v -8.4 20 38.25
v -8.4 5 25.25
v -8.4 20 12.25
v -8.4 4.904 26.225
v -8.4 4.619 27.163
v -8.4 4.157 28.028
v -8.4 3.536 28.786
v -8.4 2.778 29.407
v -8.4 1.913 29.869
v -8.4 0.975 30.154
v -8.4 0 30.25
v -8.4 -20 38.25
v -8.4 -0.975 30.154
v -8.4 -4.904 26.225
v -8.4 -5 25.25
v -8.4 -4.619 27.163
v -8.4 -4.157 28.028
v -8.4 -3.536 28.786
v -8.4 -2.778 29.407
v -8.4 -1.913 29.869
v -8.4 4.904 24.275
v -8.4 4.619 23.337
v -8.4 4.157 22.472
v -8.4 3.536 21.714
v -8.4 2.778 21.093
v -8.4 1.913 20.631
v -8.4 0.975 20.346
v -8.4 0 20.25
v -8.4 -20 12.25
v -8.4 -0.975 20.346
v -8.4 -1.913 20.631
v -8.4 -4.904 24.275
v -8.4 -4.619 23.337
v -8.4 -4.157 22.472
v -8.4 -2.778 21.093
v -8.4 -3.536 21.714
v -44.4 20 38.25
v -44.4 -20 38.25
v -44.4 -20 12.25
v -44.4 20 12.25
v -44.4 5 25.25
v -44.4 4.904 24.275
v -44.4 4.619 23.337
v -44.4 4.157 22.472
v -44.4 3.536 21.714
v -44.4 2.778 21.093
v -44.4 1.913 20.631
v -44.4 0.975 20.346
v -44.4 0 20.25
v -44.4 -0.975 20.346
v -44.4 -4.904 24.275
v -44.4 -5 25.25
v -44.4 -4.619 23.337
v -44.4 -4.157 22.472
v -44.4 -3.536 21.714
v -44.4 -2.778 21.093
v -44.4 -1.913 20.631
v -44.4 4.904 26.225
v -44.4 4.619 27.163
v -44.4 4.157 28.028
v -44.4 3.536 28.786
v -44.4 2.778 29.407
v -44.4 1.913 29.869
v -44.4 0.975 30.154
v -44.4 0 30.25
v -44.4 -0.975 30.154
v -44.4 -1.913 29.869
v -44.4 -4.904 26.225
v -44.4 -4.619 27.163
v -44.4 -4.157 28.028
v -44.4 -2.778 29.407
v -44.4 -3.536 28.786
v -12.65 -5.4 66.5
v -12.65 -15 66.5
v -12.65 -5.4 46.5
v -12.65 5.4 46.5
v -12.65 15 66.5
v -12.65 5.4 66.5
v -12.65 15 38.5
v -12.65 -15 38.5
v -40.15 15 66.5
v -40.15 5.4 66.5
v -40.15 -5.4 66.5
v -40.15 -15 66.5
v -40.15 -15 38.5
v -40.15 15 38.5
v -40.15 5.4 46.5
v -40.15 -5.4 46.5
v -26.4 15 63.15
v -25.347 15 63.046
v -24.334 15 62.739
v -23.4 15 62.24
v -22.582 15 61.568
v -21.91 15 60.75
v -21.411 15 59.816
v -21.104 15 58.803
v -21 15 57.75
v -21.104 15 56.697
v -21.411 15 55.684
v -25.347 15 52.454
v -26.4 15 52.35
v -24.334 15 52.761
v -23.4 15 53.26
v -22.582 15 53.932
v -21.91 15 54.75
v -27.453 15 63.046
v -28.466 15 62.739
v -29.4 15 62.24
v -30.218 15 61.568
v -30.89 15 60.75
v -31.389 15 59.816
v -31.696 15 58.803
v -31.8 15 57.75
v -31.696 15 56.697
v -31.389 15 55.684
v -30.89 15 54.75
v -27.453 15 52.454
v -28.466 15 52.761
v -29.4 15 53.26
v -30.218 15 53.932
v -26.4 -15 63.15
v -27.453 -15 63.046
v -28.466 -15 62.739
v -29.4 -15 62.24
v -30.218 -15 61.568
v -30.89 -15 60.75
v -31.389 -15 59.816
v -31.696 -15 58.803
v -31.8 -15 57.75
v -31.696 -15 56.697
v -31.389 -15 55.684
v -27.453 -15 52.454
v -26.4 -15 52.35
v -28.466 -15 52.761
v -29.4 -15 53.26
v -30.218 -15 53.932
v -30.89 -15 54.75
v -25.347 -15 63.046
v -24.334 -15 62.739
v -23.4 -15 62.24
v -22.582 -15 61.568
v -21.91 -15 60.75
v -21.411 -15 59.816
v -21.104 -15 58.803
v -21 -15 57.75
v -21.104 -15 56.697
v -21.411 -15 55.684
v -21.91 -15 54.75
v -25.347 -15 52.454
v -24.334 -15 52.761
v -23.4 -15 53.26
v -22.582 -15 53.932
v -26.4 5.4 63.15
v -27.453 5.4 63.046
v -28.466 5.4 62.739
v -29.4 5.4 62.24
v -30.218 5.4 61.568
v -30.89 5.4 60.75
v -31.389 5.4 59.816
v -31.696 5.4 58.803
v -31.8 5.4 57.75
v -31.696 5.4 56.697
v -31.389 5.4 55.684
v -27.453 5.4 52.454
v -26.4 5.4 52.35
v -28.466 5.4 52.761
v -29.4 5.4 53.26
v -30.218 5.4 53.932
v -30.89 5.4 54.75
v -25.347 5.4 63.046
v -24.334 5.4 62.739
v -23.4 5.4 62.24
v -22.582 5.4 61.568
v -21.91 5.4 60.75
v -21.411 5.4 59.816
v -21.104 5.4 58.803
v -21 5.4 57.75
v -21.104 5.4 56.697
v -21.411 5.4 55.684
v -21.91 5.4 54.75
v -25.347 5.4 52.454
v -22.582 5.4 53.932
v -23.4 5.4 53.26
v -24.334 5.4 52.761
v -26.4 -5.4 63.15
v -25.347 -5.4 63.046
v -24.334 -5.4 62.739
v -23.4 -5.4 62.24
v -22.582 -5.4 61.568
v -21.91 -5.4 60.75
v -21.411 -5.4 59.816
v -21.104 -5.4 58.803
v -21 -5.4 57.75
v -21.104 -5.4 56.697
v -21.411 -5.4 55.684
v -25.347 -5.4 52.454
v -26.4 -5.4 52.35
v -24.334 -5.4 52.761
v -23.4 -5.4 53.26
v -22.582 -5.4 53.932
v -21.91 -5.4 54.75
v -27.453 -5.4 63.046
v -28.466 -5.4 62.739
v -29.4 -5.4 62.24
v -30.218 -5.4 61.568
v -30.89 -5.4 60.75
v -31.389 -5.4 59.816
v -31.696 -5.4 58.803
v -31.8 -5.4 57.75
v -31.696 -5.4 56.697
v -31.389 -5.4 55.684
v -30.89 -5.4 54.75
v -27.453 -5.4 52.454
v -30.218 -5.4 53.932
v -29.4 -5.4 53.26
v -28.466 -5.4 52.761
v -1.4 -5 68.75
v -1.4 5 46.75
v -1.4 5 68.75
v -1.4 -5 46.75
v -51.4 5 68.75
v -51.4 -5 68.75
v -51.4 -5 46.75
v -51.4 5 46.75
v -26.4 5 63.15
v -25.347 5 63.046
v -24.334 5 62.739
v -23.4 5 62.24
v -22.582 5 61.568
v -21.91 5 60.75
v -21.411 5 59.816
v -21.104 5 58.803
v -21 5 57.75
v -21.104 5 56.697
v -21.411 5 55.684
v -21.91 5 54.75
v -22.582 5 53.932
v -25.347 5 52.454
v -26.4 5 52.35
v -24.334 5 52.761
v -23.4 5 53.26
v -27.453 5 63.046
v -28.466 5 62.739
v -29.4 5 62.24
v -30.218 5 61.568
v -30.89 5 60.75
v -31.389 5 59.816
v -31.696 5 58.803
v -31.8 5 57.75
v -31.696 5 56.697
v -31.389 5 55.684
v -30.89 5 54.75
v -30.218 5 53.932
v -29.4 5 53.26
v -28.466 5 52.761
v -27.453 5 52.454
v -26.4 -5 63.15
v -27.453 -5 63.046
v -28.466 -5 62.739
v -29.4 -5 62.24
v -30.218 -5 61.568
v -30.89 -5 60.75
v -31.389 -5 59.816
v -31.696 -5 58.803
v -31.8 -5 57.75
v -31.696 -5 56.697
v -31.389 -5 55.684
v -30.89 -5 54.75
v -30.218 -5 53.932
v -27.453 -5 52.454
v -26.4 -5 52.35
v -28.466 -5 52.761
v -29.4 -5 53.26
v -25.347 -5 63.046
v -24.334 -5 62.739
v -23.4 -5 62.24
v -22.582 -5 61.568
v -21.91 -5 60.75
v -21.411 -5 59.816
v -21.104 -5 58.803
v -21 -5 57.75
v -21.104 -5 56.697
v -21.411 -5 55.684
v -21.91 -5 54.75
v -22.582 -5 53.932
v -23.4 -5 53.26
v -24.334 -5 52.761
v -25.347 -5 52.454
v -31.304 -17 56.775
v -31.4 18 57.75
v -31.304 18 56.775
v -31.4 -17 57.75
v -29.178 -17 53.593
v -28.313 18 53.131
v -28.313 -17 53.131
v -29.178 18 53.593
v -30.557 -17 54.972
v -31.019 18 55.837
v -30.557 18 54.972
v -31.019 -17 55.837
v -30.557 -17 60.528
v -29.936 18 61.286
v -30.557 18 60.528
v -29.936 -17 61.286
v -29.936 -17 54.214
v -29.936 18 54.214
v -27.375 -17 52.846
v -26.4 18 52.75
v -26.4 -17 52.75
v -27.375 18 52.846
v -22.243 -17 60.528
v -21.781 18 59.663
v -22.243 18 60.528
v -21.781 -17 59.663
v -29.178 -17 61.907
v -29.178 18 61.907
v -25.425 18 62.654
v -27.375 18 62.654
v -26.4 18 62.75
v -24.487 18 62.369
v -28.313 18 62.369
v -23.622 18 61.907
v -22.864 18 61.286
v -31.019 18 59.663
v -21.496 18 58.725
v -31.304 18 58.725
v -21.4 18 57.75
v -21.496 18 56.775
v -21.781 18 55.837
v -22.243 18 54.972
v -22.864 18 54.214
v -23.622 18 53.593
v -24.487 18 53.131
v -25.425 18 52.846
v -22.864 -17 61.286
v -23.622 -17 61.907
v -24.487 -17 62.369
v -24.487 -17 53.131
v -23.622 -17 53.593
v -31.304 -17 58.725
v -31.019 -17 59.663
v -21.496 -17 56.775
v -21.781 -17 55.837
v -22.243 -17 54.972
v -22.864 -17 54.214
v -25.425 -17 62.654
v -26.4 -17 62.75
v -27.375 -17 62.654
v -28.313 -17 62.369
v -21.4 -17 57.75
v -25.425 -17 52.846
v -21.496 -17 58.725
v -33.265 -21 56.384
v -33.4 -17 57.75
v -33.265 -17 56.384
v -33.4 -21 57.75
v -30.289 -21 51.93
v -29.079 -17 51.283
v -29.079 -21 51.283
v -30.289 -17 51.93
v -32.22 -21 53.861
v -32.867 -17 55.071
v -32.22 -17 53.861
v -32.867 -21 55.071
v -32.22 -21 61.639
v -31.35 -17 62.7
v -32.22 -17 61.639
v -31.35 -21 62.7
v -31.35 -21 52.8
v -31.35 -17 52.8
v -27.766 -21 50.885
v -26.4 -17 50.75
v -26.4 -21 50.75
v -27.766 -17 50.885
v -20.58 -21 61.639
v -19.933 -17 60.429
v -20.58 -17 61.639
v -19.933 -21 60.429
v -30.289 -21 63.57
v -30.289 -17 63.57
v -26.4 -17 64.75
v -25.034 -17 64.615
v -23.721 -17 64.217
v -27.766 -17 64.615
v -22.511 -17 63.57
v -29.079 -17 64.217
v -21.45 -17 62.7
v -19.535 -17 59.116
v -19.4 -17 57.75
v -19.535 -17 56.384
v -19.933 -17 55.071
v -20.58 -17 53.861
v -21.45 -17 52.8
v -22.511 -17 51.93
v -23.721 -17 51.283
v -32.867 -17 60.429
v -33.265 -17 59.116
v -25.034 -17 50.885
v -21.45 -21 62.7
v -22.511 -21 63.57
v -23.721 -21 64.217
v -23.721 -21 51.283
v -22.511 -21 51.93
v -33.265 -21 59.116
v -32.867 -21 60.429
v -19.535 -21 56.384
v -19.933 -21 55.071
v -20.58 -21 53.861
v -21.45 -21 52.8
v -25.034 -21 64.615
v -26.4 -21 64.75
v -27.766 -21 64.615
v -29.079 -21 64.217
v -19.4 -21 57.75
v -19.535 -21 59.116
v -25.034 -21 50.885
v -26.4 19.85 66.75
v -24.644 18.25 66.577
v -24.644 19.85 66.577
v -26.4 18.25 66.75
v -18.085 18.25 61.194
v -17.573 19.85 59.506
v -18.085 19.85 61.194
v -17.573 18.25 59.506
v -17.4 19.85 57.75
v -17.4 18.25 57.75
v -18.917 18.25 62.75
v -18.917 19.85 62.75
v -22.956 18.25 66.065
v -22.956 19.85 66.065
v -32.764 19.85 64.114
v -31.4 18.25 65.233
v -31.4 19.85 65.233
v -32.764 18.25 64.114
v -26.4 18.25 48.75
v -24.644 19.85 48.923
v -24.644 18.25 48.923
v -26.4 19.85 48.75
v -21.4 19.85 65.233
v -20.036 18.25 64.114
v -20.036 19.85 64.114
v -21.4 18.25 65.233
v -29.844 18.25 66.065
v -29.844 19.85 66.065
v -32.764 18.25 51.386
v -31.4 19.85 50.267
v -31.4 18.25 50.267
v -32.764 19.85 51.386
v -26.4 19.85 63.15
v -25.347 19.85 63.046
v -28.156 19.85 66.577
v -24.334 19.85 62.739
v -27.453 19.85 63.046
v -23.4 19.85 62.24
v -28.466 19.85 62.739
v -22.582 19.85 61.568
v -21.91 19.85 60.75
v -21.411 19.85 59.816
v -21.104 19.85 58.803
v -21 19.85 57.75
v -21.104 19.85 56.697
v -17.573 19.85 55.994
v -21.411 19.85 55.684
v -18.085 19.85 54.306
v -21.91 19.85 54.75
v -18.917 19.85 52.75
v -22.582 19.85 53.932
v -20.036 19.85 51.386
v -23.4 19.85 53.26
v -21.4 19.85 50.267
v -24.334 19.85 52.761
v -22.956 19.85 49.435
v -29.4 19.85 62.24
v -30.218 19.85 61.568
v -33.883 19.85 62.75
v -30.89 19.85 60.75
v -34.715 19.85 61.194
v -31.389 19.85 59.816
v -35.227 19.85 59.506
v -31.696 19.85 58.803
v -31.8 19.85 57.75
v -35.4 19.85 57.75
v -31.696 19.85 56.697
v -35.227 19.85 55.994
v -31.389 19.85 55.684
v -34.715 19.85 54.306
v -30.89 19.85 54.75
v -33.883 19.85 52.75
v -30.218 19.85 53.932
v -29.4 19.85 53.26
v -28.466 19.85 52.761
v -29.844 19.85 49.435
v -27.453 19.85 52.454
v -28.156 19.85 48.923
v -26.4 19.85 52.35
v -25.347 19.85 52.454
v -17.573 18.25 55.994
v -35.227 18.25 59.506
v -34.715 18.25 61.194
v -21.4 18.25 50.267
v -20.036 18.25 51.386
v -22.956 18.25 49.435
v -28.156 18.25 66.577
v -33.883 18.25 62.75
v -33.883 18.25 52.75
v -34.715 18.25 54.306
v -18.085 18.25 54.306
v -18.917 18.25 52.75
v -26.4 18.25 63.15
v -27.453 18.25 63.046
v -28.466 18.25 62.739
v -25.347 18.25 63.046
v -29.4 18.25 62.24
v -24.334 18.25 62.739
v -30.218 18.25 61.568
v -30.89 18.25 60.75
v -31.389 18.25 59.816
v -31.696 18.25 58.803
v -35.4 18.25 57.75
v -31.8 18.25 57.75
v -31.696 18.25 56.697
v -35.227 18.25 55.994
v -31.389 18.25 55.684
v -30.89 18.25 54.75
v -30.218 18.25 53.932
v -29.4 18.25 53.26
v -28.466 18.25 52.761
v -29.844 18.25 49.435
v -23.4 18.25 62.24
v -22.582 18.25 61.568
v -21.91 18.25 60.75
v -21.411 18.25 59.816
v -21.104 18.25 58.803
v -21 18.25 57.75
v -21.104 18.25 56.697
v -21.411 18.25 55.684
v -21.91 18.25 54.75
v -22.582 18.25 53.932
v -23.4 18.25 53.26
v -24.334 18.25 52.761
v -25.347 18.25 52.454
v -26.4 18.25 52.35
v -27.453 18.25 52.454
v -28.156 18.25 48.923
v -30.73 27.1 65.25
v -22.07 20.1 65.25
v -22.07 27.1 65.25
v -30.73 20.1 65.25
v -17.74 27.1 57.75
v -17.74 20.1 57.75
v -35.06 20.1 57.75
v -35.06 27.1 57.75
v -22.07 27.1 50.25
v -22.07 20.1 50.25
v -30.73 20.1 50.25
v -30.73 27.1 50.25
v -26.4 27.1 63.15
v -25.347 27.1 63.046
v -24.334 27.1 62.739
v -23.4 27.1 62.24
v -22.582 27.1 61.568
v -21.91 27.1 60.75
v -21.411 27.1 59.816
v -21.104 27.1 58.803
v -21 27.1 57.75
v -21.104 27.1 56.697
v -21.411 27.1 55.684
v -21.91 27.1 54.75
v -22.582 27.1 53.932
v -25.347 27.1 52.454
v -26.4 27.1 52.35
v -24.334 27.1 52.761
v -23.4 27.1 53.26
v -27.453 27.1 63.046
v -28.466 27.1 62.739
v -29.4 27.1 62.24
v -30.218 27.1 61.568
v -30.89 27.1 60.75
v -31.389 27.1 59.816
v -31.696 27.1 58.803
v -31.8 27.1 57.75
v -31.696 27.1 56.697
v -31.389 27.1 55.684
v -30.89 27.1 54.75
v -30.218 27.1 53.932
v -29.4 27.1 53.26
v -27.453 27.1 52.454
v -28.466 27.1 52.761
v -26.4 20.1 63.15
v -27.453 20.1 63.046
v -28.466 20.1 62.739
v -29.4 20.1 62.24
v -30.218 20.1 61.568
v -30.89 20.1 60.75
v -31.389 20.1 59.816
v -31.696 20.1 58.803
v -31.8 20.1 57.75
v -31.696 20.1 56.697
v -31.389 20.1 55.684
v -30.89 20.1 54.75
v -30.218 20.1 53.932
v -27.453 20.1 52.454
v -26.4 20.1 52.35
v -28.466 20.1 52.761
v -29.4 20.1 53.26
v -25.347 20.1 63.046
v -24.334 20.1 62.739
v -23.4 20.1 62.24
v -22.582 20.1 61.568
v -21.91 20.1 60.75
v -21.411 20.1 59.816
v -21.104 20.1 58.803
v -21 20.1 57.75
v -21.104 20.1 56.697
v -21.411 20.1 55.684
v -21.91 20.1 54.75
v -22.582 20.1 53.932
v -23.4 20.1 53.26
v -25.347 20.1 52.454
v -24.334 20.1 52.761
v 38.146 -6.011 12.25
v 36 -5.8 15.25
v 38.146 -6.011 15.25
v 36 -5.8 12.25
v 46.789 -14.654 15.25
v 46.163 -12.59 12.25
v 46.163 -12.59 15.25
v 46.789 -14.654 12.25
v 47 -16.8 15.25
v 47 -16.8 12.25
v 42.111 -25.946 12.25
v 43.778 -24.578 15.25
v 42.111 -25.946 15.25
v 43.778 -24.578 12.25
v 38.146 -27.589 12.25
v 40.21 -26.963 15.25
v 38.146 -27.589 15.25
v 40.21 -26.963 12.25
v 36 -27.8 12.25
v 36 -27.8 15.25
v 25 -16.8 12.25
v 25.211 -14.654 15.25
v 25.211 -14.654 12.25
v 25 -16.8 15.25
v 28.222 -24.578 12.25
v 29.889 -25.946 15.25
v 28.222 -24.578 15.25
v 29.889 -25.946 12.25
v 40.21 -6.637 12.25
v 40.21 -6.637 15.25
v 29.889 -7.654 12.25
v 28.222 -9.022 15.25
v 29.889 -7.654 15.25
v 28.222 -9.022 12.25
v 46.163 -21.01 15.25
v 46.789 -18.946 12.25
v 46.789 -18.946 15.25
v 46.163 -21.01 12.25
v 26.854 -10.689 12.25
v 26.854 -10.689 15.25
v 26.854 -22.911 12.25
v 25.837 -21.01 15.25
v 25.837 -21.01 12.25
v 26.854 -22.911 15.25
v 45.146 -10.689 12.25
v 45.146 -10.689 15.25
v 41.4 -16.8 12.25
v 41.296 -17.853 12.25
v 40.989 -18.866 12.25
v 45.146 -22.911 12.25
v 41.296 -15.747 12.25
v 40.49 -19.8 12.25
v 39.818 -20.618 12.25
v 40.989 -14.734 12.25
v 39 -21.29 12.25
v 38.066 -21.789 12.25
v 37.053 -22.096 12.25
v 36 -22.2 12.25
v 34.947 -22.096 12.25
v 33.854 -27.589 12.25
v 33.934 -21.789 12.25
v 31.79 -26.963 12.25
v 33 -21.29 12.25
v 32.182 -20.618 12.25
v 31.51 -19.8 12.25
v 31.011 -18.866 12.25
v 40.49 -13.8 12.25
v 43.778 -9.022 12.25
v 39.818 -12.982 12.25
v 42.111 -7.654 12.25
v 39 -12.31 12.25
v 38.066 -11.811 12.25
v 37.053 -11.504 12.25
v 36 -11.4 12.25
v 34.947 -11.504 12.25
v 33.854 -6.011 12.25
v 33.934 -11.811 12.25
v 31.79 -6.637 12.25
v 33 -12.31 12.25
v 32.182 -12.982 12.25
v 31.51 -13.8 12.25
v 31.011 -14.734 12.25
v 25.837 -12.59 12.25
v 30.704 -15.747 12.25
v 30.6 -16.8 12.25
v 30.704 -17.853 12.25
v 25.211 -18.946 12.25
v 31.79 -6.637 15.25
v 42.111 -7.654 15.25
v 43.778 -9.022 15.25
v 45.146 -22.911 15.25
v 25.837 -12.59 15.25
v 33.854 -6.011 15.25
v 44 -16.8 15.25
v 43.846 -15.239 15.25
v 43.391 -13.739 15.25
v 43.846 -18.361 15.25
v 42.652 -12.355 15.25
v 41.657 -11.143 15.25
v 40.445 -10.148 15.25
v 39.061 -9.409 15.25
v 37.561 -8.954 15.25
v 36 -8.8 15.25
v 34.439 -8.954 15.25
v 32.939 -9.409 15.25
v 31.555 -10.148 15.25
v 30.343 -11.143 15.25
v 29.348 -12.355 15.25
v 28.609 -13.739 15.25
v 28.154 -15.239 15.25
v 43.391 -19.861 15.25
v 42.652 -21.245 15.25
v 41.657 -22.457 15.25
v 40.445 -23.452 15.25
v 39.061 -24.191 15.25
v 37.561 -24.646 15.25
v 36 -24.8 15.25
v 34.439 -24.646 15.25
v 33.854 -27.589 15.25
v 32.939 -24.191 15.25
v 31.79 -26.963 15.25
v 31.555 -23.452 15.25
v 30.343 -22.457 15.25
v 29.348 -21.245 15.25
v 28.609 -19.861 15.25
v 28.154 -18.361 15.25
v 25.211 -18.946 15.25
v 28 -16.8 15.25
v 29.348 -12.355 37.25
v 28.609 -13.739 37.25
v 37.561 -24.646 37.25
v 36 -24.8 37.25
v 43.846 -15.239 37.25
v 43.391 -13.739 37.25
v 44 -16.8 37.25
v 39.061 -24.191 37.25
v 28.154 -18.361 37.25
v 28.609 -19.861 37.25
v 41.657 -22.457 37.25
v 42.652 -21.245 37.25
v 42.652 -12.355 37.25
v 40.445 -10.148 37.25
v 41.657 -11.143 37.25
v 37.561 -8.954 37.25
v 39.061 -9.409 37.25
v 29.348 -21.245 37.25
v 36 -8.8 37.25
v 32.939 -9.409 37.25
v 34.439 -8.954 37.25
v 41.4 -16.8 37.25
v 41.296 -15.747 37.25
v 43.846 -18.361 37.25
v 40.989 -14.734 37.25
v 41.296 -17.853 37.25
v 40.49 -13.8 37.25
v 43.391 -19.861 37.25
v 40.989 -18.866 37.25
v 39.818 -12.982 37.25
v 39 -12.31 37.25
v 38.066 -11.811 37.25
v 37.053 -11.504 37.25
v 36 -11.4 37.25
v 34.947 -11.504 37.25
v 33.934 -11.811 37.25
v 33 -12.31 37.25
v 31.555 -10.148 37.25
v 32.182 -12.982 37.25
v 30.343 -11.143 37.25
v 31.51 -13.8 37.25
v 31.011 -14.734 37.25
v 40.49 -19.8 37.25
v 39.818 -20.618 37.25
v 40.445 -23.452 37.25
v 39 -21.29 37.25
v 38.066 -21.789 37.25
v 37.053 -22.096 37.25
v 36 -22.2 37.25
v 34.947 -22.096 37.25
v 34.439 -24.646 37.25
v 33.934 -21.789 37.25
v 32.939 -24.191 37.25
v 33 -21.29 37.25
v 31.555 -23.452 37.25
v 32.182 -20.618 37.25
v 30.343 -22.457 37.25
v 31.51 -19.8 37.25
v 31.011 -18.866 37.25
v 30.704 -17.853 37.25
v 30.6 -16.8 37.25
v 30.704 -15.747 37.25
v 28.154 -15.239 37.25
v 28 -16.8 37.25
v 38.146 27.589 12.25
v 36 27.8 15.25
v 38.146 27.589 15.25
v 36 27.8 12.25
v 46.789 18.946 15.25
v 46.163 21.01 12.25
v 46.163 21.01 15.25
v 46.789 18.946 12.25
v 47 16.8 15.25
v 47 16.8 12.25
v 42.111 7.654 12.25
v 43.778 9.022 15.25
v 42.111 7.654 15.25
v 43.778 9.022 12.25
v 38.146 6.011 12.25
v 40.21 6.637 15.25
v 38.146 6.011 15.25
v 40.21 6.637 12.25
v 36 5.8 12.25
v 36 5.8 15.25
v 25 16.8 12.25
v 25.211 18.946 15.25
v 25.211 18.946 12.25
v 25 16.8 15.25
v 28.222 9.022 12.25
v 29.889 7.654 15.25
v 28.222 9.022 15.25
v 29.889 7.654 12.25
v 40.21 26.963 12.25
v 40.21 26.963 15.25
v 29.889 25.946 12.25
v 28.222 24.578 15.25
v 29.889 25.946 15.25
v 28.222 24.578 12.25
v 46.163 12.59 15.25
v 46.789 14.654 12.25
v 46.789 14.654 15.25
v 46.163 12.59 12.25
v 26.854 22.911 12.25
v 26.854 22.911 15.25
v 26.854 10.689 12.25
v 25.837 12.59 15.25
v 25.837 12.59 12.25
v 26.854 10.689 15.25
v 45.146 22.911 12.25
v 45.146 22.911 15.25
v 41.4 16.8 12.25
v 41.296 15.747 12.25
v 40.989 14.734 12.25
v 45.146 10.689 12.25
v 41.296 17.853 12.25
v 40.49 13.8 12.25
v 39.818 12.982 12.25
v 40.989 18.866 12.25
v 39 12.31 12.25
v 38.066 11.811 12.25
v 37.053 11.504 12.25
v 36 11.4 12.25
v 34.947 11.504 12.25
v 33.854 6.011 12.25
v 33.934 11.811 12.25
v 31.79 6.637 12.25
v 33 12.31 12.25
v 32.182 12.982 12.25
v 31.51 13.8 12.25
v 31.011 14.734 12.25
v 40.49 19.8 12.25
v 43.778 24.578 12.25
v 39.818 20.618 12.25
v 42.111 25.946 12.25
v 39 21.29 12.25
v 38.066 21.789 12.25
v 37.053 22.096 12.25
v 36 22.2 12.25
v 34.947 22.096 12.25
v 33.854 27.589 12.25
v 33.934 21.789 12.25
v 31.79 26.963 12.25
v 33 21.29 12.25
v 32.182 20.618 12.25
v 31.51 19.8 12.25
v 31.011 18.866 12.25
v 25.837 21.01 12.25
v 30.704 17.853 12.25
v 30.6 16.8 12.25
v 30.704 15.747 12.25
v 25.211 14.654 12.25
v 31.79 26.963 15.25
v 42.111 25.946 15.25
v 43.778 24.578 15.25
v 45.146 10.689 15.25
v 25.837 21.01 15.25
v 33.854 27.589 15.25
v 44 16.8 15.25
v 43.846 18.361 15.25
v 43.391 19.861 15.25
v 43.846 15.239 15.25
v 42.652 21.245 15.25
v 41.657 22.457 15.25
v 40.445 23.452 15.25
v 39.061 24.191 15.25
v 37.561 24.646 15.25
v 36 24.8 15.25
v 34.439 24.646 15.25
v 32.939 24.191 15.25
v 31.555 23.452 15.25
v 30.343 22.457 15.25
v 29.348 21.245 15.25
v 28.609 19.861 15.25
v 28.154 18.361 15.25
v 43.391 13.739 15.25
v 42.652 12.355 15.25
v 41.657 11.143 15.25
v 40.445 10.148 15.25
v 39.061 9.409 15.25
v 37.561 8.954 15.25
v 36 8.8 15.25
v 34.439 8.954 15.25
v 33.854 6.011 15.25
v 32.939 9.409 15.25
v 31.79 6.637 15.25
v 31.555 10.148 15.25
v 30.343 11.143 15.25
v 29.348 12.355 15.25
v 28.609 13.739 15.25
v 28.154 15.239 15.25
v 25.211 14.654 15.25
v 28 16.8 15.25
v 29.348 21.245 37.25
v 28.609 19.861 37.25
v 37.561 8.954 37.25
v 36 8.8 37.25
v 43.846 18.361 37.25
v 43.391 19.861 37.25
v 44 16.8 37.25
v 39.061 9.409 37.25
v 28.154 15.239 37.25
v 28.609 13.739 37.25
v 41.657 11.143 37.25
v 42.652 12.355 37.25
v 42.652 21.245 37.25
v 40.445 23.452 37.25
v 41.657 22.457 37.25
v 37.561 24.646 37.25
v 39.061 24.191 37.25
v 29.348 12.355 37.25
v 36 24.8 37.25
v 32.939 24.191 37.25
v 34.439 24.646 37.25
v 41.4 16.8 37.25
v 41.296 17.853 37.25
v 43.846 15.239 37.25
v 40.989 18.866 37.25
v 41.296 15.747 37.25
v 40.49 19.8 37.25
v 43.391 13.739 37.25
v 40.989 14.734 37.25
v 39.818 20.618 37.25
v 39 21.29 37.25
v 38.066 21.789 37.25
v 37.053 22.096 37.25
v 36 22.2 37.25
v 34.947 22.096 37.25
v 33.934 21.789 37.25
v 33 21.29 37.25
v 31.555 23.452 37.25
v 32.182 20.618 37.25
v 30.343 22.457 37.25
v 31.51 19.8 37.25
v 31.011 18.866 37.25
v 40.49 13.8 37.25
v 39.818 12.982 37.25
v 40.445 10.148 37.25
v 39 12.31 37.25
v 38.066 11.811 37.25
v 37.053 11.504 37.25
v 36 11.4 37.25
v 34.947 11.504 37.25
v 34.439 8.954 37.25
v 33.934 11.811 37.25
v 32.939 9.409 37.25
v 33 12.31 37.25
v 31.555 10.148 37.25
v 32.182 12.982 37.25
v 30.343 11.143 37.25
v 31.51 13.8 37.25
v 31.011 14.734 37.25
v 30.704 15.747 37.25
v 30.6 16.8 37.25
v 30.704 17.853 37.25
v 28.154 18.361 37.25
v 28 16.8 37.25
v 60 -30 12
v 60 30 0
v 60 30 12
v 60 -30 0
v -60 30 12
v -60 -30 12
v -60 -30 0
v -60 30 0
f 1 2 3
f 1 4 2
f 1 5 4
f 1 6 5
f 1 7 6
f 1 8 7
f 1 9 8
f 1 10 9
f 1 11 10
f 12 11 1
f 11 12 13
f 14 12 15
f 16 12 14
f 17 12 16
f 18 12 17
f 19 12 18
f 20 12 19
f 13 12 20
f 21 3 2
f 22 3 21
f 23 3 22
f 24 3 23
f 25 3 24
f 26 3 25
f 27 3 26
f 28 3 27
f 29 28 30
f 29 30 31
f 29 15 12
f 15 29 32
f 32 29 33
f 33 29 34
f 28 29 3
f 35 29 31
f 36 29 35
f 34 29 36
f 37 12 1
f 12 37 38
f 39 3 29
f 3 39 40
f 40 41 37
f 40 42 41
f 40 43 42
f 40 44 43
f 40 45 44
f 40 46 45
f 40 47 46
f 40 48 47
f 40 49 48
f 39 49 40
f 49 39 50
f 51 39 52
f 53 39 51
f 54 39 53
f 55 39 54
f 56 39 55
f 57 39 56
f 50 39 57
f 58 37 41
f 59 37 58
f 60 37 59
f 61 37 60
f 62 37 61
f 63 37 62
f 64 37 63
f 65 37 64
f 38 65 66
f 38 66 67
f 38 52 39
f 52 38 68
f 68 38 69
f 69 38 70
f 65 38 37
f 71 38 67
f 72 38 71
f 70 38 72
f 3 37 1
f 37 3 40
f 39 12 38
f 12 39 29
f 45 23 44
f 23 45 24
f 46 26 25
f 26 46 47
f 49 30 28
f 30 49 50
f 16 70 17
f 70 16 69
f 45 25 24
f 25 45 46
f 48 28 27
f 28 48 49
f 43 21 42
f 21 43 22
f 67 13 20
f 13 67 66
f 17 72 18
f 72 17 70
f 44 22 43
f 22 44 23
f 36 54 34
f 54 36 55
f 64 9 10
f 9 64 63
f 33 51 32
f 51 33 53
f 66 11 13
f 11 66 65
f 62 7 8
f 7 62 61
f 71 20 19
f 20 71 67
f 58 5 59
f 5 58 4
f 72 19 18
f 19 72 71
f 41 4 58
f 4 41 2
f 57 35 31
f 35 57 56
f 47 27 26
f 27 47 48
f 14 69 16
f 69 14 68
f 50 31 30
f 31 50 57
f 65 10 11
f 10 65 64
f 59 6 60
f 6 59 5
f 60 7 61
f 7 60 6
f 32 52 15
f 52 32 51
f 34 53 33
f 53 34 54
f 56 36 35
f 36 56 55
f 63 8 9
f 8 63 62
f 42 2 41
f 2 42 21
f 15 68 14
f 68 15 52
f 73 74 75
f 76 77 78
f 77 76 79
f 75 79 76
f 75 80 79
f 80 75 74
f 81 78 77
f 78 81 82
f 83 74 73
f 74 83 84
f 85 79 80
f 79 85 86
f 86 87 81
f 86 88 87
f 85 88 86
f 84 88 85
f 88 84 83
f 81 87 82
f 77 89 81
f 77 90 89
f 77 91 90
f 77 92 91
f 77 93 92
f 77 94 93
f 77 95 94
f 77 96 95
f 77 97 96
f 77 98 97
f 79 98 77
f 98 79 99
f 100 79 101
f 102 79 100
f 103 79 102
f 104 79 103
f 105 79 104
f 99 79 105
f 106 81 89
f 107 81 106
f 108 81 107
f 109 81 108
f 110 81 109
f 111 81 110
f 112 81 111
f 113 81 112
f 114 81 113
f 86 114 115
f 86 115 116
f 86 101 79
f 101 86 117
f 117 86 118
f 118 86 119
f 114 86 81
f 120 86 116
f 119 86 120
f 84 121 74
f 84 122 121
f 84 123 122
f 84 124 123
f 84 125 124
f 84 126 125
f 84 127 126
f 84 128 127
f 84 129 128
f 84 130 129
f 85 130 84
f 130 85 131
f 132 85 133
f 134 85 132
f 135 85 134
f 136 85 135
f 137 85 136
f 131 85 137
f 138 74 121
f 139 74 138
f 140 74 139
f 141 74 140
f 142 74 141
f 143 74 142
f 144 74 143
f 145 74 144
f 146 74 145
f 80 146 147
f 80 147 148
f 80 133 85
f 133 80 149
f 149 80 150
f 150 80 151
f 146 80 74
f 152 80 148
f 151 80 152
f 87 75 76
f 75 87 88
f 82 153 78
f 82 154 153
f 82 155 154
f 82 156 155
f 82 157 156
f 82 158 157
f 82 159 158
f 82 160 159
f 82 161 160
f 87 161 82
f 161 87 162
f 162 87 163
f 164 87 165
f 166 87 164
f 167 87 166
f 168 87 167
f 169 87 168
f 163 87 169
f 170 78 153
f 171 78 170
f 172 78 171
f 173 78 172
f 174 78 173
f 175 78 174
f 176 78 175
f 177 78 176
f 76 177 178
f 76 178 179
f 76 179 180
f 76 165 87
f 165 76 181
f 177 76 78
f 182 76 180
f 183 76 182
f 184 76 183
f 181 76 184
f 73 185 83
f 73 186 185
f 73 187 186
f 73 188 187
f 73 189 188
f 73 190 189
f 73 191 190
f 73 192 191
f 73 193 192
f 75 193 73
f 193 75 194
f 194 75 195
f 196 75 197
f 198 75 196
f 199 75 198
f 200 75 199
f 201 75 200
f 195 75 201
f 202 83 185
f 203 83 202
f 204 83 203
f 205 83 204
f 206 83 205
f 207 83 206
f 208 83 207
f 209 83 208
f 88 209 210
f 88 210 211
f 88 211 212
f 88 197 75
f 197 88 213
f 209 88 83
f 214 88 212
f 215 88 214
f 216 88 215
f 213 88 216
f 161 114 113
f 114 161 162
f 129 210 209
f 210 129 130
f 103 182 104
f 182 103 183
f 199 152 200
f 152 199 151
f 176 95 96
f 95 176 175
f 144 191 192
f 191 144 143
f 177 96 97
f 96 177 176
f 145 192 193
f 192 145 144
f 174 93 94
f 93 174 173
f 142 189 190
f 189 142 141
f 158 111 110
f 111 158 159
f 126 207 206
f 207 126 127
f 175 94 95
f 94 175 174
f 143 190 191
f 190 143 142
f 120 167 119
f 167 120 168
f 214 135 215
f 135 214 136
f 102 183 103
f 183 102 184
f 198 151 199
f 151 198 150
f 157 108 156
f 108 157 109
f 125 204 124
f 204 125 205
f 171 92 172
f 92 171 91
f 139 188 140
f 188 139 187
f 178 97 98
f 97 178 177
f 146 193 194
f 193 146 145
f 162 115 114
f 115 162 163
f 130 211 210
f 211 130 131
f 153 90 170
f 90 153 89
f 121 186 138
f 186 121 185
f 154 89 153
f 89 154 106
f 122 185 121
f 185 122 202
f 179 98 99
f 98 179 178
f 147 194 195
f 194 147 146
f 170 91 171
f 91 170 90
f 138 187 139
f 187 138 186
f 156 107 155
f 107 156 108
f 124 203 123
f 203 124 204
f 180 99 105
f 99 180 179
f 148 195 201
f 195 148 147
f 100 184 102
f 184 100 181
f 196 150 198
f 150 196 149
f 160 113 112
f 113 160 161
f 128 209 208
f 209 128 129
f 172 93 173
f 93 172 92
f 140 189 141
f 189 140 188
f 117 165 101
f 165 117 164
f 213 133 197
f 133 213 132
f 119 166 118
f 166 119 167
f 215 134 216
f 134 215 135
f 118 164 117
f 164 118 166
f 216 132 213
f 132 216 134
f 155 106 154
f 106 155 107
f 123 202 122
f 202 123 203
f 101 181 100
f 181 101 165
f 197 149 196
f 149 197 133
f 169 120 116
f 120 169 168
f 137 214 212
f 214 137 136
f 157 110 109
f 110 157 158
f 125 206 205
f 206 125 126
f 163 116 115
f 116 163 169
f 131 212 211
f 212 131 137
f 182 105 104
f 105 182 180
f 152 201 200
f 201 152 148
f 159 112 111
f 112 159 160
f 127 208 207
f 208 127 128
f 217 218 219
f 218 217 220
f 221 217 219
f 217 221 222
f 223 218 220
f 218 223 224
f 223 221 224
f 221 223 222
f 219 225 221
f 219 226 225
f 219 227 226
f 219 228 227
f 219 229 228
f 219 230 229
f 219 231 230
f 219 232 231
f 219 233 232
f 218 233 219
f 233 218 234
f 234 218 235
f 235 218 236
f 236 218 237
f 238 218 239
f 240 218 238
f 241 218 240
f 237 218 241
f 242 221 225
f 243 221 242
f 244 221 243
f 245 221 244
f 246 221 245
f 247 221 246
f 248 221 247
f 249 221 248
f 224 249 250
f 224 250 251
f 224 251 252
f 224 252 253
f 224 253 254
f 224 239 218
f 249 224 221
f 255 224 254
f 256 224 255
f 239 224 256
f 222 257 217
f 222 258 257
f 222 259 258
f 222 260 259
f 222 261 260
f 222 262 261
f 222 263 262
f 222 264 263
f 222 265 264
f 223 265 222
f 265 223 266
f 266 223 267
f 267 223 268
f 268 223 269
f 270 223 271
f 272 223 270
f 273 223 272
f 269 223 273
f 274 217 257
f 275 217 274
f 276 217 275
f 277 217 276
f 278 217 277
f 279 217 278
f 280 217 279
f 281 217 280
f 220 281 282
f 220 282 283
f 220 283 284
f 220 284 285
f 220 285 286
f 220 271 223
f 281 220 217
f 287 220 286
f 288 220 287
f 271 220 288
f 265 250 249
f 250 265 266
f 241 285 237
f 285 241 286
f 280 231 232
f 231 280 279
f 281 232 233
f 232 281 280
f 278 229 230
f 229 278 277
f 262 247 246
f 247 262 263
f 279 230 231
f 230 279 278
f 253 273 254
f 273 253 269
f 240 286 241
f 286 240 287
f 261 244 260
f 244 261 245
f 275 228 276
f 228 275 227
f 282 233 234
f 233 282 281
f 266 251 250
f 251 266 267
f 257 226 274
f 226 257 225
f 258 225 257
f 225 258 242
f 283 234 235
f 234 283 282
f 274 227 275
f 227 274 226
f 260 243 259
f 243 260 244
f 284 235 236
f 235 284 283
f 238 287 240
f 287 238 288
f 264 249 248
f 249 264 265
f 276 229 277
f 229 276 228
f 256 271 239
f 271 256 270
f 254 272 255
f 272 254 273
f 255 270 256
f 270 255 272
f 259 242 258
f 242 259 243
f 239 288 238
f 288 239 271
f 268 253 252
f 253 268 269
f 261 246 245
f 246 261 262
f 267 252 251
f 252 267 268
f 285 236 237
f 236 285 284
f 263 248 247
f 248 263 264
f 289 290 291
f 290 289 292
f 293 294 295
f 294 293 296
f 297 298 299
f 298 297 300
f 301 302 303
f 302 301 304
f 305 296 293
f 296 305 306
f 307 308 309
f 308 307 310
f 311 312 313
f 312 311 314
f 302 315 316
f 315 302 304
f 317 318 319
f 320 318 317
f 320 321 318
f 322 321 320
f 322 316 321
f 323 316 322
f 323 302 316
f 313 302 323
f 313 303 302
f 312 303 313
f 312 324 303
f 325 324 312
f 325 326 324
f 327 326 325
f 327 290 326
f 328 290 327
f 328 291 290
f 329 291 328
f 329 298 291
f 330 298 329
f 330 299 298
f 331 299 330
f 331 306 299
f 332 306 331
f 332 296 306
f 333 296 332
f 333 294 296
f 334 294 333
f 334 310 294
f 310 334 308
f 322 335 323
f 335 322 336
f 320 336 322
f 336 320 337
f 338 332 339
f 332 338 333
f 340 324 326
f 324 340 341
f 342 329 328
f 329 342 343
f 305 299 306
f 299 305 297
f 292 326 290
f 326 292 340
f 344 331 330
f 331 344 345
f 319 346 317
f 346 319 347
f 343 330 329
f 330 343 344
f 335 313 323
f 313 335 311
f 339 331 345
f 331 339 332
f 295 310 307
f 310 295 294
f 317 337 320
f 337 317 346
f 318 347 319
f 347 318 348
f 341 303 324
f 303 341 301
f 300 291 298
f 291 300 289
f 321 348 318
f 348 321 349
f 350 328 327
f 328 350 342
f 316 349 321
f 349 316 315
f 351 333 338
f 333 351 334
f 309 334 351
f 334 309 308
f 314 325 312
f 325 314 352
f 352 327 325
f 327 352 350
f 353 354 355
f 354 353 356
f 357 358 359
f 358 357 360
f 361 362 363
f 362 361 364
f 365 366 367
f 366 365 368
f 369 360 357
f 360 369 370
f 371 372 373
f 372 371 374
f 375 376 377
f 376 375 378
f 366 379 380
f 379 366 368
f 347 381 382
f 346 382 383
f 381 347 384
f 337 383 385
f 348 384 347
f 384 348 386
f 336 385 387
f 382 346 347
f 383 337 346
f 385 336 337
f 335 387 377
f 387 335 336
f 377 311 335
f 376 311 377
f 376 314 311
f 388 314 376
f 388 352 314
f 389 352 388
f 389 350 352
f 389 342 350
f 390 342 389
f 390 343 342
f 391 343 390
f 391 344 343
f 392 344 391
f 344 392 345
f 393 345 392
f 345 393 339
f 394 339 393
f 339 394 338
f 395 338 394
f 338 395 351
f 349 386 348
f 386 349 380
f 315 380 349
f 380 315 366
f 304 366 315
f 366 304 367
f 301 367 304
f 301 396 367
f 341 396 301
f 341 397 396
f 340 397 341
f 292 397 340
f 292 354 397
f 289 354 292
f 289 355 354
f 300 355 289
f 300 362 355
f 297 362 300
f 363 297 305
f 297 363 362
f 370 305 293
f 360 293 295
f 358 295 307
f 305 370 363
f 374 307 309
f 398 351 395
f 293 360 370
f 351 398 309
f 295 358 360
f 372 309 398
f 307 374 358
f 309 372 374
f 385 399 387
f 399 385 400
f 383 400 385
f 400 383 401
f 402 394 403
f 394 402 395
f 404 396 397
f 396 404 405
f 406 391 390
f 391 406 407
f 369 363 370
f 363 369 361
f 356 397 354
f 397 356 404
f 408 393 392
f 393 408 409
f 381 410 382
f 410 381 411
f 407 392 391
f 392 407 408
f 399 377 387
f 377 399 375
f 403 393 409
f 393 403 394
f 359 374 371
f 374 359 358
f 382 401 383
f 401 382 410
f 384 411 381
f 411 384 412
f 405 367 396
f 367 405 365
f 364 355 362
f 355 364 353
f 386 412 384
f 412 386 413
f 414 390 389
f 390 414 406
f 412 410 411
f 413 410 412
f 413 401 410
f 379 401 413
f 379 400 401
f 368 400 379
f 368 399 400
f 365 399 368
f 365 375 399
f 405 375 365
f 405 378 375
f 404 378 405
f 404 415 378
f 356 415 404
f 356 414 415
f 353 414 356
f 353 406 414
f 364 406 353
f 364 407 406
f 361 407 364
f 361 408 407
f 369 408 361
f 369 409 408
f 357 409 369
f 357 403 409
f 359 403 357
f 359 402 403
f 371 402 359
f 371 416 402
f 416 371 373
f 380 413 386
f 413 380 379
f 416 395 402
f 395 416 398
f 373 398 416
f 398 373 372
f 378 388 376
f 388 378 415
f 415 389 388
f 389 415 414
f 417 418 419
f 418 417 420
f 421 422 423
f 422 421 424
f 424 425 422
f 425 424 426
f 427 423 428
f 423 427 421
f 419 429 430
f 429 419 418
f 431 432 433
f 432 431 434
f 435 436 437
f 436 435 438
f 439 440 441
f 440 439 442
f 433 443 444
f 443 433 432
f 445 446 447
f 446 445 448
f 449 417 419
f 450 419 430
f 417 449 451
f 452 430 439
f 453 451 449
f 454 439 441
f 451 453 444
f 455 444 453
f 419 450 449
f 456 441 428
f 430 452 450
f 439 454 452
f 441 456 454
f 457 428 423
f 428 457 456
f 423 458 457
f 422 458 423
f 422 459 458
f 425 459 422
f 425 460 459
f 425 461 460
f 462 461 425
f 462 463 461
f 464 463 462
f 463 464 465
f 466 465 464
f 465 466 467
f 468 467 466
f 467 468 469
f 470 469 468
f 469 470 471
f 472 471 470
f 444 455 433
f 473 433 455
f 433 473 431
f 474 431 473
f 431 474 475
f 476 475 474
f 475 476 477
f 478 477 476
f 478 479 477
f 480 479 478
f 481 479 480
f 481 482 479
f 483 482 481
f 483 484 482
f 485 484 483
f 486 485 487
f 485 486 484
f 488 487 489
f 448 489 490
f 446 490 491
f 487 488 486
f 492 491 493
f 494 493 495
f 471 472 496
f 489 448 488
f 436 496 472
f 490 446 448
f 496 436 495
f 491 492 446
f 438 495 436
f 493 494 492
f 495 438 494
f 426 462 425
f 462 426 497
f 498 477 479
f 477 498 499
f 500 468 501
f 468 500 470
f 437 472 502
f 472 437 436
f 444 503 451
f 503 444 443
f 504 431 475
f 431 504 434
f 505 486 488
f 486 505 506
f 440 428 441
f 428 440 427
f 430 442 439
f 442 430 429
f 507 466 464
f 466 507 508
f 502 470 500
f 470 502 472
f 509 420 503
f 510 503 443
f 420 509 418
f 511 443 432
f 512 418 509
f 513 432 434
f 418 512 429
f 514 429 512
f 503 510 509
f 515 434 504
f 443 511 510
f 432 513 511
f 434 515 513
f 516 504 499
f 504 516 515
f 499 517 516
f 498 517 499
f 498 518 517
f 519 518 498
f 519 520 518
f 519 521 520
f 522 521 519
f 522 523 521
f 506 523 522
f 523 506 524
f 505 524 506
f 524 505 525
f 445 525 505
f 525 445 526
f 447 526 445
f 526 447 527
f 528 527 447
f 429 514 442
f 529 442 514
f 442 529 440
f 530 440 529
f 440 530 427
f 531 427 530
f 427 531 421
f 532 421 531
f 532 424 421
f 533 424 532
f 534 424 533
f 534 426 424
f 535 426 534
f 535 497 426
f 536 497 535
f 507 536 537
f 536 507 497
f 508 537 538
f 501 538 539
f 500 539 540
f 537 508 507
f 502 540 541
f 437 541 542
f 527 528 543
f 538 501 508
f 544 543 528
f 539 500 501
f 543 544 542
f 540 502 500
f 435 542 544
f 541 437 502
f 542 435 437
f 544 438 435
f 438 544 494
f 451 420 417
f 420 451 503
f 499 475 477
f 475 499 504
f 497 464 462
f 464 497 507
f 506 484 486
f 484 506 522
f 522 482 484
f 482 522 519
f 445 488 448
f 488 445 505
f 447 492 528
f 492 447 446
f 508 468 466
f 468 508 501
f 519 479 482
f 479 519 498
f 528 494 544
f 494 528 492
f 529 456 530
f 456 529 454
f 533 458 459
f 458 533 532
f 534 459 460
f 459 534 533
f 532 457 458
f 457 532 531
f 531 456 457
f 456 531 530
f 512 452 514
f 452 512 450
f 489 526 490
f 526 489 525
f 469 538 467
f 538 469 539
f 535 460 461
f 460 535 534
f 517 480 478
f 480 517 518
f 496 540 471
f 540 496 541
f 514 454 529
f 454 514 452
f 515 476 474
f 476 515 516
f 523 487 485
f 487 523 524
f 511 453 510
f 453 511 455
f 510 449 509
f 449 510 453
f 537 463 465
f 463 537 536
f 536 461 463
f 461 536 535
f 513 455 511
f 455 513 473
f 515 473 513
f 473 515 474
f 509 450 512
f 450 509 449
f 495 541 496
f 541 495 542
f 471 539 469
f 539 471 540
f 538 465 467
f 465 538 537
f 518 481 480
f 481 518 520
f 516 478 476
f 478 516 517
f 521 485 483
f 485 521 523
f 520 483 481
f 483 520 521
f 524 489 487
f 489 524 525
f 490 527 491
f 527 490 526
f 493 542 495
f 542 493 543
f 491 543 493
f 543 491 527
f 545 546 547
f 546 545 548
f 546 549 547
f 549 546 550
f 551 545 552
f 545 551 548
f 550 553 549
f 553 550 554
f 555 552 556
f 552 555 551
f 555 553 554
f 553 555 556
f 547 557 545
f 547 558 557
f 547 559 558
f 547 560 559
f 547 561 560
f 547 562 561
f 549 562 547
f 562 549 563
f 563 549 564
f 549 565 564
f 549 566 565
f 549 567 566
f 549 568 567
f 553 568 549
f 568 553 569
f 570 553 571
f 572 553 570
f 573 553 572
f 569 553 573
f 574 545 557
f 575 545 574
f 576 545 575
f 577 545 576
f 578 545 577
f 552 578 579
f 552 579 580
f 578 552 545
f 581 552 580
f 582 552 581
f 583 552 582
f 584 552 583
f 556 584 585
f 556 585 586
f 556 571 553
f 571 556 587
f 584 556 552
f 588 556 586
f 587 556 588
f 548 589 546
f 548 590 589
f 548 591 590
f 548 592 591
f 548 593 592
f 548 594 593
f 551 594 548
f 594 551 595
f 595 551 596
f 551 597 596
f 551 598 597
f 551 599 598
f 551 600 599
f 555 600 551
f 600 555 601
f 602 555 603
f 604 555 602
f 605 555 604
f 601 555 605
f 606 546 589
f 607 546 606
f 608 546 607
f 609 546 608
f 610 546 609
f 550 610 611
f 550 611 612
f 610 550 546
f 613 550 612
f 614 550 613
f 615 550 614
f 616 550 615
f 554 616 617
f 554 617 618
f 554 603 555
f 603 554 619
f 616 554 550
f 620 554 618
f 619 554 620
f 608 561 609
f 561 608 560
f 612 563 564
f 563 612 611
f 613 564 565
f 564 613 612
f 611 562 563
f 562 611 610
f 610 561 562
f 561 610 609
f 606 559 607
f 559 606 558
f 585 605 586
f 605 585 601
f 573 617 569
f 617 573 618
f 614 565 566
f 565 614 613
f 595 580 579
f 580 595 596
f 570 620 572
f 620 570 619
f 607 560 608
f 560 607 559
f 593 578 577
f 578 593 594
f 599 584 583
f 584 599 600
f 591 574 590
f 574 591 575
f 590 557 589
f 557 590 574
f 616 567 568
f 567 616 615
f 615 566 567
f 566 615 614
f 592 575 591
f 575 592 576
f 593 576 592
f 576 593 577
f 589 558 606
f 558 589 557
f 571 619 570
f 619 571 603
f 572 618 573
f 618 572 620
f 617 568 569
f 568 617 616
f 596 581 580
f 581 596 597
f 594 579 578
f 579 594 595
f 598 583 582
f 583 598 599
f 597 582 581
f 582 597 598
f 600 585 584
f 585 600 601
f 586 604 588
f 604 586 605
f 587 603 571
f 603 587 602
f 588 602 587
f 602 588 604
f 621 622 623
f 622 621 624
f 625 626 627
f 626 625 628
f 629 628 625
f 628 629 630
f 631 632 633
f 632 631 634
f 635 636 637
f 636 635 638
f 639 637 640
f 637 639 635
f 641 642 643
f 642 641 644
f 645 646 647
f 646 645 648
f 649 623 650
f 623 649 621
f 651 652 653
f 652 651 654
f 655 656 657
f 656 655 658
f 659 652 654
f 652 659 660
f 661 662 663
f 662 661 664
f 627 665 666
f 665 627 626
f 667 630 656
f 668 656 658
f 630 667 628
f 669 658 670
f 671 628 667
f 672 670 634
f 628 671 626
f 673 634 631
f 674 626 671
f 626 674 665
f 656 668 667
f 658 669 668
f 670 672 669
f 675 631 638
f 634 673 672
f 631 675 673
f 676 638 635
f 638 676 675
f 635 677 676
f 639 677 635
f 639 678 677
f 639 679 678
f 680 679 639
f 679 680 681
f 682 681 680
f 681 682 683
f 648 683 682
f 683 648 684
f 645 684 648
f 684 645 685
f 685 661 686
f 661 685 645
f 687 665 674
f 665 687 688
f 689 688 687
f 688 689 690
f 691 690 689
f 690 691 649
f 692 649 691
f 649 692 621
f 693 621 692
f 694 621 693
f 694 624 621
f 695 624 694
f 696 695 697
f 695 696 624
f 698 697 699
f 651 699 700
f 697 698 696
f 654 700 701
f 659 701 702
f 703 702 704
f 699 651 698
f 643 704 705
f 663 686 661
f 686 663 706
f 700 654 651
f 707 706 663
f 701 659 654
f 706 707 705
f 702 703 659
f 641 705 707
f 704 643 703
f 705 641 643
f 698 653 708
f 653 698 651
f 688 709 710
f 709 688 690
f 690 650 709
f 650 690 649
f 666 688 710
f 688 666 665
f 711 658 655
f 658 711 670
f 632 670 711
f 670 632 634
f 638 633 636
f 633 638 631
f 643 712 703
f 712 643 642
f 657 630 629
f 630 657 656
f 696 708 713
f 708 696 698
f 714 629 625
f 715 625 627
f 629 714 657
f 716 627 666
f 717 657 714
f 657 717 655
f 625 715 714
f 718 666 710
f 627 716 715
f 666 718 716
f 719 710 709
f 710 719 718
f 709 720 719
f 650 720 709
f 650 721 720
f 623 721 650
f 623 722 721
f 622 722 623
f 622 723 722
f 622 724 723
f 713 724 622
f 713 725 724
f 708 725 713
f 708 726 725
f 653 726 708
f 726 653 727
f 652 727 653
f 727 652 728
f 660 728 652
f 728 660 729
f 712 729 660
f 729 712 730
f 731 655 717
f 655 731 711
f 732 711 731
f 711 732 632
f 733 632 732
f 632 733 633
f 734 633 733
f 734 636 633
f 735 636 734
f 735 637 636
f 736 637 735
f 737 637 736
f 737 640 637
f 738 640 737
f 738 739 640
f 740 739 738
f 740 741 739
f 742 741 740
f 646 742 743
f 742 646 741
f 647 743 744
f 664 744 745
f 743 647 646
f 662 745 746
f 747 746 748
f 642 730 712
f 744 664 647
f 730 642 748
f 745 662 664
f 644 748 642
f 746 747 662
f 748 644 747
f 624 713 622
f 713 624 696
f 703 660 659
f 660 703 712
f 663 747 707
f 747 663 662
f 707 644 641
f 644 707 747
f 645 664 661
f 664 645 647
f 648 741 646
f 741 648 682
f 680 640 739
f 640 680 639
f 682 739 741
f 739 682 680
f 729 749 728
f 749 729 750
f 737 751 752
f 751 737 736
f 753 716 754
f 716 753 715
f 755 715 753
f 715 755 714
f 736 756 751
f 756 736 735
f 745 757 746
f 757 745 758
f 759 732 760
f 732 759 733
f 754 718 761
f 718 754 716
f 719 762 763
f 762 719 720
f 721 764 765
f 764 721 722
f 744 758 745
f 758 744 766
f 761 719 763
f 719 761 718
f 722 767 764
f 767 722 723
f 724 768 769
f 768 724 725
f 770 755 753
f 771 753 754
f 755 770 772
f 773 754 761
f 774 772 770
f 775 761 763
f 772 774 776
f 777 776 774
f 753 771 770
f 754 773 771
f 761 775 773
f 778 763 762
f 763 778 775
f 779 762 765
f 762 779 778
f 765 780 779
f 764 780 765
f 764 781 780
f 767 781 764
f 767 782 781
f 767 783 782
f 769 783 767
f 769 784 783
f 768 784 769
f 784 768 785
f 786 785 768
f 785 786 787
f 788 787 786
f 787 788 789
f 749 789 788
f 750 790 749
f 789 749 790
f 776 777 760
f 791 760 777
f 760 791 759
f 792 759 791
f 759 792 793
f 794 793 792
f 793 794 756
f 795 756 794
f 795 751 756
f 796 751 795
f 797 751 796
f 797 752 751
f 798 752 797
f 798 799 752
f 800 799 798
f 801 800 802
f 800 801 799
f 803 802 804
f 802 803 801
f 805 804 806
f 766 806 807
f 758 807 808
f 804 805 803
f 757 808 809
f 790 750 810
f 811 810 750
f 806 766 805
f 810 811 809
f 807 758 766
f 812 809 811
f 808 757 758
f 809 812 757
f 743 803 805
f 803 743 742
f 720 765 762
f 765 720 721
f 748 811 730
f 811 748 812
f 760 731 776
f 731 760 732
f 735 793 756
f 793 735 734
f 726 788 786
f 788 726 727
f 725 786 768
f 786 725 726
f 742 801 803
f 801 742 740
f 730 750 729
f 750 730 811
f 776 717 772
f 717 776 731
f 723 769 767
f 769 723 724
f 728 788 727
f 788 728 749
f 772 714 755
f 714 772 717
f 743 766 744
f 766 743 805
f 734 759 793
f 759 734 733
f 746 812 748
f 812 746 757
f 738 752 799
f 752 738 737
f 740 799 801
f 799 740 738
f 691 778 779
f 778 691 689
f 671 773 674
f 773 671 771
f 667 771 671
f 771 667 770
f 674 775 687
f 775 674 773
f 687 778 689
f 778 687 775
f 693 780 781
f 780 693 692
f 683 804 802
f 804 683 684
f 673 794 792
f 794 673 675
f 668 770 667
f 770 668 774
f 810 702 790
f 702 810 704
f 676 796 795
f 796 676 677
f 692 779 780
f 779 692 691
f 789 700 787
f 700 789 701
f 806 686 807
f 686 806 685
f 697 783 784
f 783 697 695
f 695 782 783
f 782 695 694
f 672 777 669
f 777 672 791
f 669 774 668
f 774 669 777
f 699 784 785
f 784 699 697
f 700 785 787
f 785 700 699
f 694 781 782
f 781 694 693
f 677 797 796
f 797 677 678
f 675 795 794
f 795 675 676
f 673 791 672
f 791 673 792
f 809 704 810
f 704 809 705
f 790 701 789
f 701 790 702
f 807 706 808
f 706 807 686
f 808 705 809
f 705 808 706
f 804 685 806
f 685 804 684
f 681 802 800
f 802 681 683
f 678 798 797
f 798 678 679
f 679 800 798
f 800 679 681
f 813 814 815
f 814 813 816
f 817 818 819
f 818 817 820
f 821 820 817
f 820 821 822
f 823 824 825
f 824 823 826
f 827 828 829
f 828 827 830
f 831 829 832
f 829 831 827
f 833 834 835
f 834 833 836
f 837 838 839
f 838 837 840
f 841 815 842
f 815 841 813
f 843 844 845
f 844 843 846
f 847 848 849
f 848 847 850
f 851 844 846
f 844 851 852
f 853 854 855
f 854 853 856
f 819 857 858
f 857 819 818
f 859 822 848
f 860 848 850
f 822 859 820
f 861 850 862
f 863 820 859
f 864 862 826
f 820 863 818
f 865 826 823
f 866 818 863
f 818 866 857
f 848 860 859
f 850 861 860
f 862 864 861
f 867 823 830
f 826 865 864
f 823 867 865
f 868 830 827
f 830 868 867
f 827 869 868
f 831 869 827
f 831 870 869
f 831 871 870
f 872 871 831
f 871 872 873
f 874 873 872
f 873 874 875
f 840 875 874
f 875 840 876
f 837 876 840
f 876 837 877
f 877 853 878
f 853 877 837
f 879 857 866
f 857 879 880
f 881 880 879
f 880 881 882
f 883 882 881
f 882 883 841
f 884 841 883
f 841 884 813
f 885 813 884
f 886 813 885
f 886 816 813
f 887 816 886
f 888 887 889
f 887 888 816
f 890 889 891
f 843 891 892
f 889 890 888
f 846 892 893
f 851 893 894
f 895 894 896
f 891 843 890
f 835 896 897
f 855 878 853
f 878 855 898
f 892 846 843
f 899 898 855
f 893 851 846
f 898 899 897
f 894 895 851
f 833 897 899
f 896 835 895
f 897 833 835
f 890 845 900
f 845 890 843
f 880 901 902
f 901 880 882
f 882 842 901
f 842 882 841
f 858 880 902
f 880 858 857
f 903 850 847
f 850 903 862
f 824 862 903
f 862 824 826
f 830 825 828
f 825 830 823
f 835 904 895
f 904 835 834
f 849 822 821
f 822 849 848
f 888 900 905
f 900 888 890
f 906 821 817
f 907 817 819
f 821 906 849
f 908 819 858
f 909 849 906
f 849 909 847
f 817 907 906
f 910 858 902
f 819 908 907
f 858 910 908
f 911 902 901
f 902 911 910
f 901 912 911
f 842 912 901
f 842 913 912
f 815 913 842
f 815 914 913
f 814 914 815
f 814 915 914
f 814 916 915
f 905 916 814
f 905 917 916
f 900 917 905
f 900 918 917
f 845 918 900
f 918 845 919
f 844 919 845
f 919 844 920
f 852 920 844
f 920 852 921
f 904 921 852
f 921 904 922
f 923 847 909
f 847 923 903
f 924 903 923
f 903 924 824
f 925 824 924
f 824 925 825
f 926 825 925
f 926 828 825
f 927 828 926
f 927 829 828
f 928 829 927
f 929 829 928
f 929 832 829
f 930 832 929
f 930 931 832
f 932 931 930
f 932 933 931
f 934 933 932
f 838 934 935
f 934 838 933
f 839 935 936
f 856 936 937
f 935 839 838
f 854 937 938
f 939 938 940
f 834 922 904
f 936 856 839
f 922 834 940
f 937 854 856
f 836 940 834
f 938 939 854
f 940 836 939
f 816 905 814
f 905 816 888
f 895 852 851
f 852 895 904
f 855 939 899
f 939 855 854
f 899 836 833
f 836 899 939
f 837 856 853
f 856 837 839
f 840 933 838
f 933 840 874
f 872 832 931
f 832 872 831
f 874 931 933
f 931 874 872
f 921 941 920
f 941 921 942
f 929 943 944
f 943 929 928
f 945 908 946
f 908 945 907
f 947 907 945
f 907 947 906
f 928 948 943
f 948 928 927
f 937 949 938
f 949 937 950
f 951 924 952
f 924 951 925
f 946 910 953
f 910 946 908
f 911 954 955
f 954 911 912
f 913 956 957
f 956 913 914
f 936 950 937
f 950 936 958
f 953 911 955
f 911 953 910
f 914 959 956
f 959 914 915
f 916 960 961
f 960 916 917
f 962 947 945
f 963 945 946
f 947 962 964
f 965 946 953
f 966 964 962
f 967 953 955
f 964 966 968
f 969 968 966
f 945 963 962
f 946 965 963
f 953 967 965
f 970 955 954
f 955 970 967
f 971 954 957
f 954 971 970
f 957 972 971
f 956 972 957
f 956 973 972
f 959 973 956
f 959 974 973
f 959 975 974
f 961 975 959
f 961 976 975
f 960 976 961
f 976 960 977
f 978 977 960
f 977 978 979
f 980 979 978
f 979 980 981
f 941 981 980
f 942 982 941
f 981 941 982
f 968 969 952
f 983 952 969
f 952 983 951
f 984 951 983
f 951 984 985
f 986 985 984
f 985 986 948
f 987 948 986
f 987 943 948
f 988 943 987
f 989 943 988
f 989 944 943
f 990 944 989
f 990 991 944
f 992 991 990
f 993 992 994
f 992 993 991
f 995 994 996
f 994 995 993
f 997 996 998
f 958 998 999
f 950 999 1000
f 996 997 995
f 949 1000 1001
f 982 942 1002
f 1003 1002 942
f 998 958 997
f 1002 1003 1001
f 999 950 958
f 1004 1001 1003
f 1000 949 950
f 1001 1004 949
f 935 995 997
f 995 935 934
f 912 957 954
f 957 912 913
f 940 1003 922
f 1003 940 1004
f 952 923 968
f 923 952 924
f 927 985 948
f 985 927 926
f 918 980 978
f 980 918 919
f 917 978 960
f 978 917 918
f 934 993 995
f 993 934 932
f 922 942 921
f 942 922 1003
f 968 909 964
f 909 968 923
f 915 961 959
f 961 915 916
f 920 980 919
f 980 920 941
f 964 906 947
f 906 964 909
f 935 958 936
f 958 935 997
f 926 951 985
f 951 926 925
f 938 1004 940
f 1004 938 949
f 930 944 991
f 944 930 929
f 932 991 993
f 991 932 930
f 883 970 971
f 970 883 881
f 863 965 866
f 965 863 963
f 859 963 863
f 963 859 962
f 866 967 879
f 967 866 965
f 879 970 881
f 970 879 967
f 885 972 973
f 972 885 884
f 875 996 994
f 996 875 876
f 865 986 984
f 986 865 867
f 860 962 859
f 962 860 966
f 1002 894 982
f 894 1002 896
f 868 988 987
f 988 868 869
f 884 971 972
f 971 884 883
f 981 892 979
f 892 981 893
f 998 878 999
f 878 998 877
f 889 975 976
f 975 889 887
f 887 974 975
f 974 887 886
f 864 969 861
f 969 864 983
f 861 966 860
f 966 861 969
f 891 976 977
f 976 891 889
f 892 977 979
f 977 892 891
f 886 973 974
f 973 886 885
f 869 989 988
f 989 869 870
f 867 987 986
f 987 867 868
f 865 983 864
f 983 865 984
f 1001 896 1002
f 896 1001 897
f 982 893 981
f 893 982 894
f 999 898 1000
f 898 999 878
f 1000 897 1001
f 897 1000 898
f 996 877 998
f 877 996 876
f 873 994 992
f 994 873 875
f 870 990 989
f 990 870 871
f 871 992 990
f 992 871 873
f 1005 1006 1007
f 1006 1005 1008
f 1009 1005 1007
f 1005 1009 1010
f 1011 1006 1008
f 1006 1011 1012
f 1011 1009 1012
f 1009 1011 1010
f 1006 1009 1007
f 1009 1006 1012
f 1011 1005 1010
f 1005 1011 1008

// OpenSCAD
$fn = 32;

// ------------------------------------------------------------------------
// Indexing jig: plate 120 x 60 mm, pin d10
// Every part is its own module, assembly() places every instance.
// ------------------------------------------------------------------------

// --- part 1 ---
module jig_plate() {
  difference() {
    translate([-60, -30, 0]) cube([120, 60, 12]);
  }
}

// --- part 2 ---
module locator_block() {
  difference() {
    translate([-18, -20, 0]) cube([36, 40, 26]);
    translate([0, 0, 13]) rotate([0, 90, 0]) cylinder(h = 38, d = 10, center = true);
  }
}

// --- part 3 ---
module index_fork() {
  difference() {
    translate([-13.75, -15, 0]) cube([27.5, 30, 28]);
    translate([-14.75, -5.4, 8]) cube([29.5, 10.8, 21]);
    translate([0, 0, 19.25]) rotate([90, 0, 0]) cylinder(h = 32, d = 10.8, center = true);
  }
}

// --- part 4 ---
module index_arm() {
  difference() {
    translate([-25, -5, 0]) cube([50, 10, 22]);
    translate([0, 0, 11]) rotate([90, 0, 0]) cylinder(h = 12, d = 10.8, center = true);
  }
}

// --- part 5 ---
module index_pin() {
  rotate([0, 90, 0]) cylinder(h = 36, d = 10, center = true);
  translate([-21, 0, 0]) rotate([0, 90, 0]) cylinder(h = 4, d = 14);
}

// --- part 6 ---
module pin_washer() {
  difference() {
      translate([0, 0, 0]) cylinder(h = 1.6, d = 18);
      translate([0, 0, -1]) cylinder(h = 3.6, d = 10.8);
    }
}

// --- part 7 ---
module lock_nut() {
  difference() {
    linear_extrude(height = 7) polygon(points = [[8.66, 0], [4.33, 7.5], [-4.33, 7.5], [-8.66, 0], [-4.33, -7.5], [4.33, -7.5]]);
    translate([0, 0, -1]) cylinder(h = 9, d = 10.8);
  }
}

// --- part 8 ---
module guide_bush_a() {
  difference() {
    union() {
      cylinder(h = 3, d = 22);
      translate([0, 0, 3]) cylinder(h = 22, d = 16);
    }
    translate([0, 0, -1]) cylinder(h = 27, d = 10.8);
  }
}

// --- part 9 ---
module guide_bush_b() {
  difference() {
    union() {
      cylinder(h = 3, d = 22);
      translate([0, 0, 3]) cylinder(h = 22, d = 16);
    }
    translate([0, 0, -1]) cylinder(h = 27, d = 10.8);
  }
}

// --- assembly ---
module assembly() {
  color([0.80, 0.24, 0.20]) translate([0, 0, 0]) rotate([0, 0, 0]) jig_plate();
  color([0.20, 0.45, 0.75]) translate([-26.4, 0, 12.25]) rotate([0, 0, 0]) locator_block();
  color([0.25, 0.62, 0.32]) translate([-26.4, 0, 38.5]) rotate([0, 0, 0]) index_fork();
  color([0.92, 0.70, 0.18]) translate([-26.4, 0, 46.75]) rotate([0, 0, 0]) index_arm();
  color([0.58, 0.35, 0.70]) translate([-26.4, 0, 57.75]) rotate([0, 0, 90]) index_pin();
  color([0.16, 0.66, 0.66]) translate([-26.4, 19.85, 57.75]) rotate([90, 0, 0]) pin_washer();
  color([0.85, 0.48, 0.18]) translate([-26.4, 27.1, 57.75]) rotate([90, 0, 0]) lock_nut();
  color([0.55, 0.60, 0.65]) translate([36, -16.8, 12.25]) rotate([0, 0, 0]) guide_bush_a();
  color([0.75, 0.30, 0.55]) translate([36, 16.8, 12.25]) rotate([0, 0, 0]) guide_bush_b();
}

assembly();
